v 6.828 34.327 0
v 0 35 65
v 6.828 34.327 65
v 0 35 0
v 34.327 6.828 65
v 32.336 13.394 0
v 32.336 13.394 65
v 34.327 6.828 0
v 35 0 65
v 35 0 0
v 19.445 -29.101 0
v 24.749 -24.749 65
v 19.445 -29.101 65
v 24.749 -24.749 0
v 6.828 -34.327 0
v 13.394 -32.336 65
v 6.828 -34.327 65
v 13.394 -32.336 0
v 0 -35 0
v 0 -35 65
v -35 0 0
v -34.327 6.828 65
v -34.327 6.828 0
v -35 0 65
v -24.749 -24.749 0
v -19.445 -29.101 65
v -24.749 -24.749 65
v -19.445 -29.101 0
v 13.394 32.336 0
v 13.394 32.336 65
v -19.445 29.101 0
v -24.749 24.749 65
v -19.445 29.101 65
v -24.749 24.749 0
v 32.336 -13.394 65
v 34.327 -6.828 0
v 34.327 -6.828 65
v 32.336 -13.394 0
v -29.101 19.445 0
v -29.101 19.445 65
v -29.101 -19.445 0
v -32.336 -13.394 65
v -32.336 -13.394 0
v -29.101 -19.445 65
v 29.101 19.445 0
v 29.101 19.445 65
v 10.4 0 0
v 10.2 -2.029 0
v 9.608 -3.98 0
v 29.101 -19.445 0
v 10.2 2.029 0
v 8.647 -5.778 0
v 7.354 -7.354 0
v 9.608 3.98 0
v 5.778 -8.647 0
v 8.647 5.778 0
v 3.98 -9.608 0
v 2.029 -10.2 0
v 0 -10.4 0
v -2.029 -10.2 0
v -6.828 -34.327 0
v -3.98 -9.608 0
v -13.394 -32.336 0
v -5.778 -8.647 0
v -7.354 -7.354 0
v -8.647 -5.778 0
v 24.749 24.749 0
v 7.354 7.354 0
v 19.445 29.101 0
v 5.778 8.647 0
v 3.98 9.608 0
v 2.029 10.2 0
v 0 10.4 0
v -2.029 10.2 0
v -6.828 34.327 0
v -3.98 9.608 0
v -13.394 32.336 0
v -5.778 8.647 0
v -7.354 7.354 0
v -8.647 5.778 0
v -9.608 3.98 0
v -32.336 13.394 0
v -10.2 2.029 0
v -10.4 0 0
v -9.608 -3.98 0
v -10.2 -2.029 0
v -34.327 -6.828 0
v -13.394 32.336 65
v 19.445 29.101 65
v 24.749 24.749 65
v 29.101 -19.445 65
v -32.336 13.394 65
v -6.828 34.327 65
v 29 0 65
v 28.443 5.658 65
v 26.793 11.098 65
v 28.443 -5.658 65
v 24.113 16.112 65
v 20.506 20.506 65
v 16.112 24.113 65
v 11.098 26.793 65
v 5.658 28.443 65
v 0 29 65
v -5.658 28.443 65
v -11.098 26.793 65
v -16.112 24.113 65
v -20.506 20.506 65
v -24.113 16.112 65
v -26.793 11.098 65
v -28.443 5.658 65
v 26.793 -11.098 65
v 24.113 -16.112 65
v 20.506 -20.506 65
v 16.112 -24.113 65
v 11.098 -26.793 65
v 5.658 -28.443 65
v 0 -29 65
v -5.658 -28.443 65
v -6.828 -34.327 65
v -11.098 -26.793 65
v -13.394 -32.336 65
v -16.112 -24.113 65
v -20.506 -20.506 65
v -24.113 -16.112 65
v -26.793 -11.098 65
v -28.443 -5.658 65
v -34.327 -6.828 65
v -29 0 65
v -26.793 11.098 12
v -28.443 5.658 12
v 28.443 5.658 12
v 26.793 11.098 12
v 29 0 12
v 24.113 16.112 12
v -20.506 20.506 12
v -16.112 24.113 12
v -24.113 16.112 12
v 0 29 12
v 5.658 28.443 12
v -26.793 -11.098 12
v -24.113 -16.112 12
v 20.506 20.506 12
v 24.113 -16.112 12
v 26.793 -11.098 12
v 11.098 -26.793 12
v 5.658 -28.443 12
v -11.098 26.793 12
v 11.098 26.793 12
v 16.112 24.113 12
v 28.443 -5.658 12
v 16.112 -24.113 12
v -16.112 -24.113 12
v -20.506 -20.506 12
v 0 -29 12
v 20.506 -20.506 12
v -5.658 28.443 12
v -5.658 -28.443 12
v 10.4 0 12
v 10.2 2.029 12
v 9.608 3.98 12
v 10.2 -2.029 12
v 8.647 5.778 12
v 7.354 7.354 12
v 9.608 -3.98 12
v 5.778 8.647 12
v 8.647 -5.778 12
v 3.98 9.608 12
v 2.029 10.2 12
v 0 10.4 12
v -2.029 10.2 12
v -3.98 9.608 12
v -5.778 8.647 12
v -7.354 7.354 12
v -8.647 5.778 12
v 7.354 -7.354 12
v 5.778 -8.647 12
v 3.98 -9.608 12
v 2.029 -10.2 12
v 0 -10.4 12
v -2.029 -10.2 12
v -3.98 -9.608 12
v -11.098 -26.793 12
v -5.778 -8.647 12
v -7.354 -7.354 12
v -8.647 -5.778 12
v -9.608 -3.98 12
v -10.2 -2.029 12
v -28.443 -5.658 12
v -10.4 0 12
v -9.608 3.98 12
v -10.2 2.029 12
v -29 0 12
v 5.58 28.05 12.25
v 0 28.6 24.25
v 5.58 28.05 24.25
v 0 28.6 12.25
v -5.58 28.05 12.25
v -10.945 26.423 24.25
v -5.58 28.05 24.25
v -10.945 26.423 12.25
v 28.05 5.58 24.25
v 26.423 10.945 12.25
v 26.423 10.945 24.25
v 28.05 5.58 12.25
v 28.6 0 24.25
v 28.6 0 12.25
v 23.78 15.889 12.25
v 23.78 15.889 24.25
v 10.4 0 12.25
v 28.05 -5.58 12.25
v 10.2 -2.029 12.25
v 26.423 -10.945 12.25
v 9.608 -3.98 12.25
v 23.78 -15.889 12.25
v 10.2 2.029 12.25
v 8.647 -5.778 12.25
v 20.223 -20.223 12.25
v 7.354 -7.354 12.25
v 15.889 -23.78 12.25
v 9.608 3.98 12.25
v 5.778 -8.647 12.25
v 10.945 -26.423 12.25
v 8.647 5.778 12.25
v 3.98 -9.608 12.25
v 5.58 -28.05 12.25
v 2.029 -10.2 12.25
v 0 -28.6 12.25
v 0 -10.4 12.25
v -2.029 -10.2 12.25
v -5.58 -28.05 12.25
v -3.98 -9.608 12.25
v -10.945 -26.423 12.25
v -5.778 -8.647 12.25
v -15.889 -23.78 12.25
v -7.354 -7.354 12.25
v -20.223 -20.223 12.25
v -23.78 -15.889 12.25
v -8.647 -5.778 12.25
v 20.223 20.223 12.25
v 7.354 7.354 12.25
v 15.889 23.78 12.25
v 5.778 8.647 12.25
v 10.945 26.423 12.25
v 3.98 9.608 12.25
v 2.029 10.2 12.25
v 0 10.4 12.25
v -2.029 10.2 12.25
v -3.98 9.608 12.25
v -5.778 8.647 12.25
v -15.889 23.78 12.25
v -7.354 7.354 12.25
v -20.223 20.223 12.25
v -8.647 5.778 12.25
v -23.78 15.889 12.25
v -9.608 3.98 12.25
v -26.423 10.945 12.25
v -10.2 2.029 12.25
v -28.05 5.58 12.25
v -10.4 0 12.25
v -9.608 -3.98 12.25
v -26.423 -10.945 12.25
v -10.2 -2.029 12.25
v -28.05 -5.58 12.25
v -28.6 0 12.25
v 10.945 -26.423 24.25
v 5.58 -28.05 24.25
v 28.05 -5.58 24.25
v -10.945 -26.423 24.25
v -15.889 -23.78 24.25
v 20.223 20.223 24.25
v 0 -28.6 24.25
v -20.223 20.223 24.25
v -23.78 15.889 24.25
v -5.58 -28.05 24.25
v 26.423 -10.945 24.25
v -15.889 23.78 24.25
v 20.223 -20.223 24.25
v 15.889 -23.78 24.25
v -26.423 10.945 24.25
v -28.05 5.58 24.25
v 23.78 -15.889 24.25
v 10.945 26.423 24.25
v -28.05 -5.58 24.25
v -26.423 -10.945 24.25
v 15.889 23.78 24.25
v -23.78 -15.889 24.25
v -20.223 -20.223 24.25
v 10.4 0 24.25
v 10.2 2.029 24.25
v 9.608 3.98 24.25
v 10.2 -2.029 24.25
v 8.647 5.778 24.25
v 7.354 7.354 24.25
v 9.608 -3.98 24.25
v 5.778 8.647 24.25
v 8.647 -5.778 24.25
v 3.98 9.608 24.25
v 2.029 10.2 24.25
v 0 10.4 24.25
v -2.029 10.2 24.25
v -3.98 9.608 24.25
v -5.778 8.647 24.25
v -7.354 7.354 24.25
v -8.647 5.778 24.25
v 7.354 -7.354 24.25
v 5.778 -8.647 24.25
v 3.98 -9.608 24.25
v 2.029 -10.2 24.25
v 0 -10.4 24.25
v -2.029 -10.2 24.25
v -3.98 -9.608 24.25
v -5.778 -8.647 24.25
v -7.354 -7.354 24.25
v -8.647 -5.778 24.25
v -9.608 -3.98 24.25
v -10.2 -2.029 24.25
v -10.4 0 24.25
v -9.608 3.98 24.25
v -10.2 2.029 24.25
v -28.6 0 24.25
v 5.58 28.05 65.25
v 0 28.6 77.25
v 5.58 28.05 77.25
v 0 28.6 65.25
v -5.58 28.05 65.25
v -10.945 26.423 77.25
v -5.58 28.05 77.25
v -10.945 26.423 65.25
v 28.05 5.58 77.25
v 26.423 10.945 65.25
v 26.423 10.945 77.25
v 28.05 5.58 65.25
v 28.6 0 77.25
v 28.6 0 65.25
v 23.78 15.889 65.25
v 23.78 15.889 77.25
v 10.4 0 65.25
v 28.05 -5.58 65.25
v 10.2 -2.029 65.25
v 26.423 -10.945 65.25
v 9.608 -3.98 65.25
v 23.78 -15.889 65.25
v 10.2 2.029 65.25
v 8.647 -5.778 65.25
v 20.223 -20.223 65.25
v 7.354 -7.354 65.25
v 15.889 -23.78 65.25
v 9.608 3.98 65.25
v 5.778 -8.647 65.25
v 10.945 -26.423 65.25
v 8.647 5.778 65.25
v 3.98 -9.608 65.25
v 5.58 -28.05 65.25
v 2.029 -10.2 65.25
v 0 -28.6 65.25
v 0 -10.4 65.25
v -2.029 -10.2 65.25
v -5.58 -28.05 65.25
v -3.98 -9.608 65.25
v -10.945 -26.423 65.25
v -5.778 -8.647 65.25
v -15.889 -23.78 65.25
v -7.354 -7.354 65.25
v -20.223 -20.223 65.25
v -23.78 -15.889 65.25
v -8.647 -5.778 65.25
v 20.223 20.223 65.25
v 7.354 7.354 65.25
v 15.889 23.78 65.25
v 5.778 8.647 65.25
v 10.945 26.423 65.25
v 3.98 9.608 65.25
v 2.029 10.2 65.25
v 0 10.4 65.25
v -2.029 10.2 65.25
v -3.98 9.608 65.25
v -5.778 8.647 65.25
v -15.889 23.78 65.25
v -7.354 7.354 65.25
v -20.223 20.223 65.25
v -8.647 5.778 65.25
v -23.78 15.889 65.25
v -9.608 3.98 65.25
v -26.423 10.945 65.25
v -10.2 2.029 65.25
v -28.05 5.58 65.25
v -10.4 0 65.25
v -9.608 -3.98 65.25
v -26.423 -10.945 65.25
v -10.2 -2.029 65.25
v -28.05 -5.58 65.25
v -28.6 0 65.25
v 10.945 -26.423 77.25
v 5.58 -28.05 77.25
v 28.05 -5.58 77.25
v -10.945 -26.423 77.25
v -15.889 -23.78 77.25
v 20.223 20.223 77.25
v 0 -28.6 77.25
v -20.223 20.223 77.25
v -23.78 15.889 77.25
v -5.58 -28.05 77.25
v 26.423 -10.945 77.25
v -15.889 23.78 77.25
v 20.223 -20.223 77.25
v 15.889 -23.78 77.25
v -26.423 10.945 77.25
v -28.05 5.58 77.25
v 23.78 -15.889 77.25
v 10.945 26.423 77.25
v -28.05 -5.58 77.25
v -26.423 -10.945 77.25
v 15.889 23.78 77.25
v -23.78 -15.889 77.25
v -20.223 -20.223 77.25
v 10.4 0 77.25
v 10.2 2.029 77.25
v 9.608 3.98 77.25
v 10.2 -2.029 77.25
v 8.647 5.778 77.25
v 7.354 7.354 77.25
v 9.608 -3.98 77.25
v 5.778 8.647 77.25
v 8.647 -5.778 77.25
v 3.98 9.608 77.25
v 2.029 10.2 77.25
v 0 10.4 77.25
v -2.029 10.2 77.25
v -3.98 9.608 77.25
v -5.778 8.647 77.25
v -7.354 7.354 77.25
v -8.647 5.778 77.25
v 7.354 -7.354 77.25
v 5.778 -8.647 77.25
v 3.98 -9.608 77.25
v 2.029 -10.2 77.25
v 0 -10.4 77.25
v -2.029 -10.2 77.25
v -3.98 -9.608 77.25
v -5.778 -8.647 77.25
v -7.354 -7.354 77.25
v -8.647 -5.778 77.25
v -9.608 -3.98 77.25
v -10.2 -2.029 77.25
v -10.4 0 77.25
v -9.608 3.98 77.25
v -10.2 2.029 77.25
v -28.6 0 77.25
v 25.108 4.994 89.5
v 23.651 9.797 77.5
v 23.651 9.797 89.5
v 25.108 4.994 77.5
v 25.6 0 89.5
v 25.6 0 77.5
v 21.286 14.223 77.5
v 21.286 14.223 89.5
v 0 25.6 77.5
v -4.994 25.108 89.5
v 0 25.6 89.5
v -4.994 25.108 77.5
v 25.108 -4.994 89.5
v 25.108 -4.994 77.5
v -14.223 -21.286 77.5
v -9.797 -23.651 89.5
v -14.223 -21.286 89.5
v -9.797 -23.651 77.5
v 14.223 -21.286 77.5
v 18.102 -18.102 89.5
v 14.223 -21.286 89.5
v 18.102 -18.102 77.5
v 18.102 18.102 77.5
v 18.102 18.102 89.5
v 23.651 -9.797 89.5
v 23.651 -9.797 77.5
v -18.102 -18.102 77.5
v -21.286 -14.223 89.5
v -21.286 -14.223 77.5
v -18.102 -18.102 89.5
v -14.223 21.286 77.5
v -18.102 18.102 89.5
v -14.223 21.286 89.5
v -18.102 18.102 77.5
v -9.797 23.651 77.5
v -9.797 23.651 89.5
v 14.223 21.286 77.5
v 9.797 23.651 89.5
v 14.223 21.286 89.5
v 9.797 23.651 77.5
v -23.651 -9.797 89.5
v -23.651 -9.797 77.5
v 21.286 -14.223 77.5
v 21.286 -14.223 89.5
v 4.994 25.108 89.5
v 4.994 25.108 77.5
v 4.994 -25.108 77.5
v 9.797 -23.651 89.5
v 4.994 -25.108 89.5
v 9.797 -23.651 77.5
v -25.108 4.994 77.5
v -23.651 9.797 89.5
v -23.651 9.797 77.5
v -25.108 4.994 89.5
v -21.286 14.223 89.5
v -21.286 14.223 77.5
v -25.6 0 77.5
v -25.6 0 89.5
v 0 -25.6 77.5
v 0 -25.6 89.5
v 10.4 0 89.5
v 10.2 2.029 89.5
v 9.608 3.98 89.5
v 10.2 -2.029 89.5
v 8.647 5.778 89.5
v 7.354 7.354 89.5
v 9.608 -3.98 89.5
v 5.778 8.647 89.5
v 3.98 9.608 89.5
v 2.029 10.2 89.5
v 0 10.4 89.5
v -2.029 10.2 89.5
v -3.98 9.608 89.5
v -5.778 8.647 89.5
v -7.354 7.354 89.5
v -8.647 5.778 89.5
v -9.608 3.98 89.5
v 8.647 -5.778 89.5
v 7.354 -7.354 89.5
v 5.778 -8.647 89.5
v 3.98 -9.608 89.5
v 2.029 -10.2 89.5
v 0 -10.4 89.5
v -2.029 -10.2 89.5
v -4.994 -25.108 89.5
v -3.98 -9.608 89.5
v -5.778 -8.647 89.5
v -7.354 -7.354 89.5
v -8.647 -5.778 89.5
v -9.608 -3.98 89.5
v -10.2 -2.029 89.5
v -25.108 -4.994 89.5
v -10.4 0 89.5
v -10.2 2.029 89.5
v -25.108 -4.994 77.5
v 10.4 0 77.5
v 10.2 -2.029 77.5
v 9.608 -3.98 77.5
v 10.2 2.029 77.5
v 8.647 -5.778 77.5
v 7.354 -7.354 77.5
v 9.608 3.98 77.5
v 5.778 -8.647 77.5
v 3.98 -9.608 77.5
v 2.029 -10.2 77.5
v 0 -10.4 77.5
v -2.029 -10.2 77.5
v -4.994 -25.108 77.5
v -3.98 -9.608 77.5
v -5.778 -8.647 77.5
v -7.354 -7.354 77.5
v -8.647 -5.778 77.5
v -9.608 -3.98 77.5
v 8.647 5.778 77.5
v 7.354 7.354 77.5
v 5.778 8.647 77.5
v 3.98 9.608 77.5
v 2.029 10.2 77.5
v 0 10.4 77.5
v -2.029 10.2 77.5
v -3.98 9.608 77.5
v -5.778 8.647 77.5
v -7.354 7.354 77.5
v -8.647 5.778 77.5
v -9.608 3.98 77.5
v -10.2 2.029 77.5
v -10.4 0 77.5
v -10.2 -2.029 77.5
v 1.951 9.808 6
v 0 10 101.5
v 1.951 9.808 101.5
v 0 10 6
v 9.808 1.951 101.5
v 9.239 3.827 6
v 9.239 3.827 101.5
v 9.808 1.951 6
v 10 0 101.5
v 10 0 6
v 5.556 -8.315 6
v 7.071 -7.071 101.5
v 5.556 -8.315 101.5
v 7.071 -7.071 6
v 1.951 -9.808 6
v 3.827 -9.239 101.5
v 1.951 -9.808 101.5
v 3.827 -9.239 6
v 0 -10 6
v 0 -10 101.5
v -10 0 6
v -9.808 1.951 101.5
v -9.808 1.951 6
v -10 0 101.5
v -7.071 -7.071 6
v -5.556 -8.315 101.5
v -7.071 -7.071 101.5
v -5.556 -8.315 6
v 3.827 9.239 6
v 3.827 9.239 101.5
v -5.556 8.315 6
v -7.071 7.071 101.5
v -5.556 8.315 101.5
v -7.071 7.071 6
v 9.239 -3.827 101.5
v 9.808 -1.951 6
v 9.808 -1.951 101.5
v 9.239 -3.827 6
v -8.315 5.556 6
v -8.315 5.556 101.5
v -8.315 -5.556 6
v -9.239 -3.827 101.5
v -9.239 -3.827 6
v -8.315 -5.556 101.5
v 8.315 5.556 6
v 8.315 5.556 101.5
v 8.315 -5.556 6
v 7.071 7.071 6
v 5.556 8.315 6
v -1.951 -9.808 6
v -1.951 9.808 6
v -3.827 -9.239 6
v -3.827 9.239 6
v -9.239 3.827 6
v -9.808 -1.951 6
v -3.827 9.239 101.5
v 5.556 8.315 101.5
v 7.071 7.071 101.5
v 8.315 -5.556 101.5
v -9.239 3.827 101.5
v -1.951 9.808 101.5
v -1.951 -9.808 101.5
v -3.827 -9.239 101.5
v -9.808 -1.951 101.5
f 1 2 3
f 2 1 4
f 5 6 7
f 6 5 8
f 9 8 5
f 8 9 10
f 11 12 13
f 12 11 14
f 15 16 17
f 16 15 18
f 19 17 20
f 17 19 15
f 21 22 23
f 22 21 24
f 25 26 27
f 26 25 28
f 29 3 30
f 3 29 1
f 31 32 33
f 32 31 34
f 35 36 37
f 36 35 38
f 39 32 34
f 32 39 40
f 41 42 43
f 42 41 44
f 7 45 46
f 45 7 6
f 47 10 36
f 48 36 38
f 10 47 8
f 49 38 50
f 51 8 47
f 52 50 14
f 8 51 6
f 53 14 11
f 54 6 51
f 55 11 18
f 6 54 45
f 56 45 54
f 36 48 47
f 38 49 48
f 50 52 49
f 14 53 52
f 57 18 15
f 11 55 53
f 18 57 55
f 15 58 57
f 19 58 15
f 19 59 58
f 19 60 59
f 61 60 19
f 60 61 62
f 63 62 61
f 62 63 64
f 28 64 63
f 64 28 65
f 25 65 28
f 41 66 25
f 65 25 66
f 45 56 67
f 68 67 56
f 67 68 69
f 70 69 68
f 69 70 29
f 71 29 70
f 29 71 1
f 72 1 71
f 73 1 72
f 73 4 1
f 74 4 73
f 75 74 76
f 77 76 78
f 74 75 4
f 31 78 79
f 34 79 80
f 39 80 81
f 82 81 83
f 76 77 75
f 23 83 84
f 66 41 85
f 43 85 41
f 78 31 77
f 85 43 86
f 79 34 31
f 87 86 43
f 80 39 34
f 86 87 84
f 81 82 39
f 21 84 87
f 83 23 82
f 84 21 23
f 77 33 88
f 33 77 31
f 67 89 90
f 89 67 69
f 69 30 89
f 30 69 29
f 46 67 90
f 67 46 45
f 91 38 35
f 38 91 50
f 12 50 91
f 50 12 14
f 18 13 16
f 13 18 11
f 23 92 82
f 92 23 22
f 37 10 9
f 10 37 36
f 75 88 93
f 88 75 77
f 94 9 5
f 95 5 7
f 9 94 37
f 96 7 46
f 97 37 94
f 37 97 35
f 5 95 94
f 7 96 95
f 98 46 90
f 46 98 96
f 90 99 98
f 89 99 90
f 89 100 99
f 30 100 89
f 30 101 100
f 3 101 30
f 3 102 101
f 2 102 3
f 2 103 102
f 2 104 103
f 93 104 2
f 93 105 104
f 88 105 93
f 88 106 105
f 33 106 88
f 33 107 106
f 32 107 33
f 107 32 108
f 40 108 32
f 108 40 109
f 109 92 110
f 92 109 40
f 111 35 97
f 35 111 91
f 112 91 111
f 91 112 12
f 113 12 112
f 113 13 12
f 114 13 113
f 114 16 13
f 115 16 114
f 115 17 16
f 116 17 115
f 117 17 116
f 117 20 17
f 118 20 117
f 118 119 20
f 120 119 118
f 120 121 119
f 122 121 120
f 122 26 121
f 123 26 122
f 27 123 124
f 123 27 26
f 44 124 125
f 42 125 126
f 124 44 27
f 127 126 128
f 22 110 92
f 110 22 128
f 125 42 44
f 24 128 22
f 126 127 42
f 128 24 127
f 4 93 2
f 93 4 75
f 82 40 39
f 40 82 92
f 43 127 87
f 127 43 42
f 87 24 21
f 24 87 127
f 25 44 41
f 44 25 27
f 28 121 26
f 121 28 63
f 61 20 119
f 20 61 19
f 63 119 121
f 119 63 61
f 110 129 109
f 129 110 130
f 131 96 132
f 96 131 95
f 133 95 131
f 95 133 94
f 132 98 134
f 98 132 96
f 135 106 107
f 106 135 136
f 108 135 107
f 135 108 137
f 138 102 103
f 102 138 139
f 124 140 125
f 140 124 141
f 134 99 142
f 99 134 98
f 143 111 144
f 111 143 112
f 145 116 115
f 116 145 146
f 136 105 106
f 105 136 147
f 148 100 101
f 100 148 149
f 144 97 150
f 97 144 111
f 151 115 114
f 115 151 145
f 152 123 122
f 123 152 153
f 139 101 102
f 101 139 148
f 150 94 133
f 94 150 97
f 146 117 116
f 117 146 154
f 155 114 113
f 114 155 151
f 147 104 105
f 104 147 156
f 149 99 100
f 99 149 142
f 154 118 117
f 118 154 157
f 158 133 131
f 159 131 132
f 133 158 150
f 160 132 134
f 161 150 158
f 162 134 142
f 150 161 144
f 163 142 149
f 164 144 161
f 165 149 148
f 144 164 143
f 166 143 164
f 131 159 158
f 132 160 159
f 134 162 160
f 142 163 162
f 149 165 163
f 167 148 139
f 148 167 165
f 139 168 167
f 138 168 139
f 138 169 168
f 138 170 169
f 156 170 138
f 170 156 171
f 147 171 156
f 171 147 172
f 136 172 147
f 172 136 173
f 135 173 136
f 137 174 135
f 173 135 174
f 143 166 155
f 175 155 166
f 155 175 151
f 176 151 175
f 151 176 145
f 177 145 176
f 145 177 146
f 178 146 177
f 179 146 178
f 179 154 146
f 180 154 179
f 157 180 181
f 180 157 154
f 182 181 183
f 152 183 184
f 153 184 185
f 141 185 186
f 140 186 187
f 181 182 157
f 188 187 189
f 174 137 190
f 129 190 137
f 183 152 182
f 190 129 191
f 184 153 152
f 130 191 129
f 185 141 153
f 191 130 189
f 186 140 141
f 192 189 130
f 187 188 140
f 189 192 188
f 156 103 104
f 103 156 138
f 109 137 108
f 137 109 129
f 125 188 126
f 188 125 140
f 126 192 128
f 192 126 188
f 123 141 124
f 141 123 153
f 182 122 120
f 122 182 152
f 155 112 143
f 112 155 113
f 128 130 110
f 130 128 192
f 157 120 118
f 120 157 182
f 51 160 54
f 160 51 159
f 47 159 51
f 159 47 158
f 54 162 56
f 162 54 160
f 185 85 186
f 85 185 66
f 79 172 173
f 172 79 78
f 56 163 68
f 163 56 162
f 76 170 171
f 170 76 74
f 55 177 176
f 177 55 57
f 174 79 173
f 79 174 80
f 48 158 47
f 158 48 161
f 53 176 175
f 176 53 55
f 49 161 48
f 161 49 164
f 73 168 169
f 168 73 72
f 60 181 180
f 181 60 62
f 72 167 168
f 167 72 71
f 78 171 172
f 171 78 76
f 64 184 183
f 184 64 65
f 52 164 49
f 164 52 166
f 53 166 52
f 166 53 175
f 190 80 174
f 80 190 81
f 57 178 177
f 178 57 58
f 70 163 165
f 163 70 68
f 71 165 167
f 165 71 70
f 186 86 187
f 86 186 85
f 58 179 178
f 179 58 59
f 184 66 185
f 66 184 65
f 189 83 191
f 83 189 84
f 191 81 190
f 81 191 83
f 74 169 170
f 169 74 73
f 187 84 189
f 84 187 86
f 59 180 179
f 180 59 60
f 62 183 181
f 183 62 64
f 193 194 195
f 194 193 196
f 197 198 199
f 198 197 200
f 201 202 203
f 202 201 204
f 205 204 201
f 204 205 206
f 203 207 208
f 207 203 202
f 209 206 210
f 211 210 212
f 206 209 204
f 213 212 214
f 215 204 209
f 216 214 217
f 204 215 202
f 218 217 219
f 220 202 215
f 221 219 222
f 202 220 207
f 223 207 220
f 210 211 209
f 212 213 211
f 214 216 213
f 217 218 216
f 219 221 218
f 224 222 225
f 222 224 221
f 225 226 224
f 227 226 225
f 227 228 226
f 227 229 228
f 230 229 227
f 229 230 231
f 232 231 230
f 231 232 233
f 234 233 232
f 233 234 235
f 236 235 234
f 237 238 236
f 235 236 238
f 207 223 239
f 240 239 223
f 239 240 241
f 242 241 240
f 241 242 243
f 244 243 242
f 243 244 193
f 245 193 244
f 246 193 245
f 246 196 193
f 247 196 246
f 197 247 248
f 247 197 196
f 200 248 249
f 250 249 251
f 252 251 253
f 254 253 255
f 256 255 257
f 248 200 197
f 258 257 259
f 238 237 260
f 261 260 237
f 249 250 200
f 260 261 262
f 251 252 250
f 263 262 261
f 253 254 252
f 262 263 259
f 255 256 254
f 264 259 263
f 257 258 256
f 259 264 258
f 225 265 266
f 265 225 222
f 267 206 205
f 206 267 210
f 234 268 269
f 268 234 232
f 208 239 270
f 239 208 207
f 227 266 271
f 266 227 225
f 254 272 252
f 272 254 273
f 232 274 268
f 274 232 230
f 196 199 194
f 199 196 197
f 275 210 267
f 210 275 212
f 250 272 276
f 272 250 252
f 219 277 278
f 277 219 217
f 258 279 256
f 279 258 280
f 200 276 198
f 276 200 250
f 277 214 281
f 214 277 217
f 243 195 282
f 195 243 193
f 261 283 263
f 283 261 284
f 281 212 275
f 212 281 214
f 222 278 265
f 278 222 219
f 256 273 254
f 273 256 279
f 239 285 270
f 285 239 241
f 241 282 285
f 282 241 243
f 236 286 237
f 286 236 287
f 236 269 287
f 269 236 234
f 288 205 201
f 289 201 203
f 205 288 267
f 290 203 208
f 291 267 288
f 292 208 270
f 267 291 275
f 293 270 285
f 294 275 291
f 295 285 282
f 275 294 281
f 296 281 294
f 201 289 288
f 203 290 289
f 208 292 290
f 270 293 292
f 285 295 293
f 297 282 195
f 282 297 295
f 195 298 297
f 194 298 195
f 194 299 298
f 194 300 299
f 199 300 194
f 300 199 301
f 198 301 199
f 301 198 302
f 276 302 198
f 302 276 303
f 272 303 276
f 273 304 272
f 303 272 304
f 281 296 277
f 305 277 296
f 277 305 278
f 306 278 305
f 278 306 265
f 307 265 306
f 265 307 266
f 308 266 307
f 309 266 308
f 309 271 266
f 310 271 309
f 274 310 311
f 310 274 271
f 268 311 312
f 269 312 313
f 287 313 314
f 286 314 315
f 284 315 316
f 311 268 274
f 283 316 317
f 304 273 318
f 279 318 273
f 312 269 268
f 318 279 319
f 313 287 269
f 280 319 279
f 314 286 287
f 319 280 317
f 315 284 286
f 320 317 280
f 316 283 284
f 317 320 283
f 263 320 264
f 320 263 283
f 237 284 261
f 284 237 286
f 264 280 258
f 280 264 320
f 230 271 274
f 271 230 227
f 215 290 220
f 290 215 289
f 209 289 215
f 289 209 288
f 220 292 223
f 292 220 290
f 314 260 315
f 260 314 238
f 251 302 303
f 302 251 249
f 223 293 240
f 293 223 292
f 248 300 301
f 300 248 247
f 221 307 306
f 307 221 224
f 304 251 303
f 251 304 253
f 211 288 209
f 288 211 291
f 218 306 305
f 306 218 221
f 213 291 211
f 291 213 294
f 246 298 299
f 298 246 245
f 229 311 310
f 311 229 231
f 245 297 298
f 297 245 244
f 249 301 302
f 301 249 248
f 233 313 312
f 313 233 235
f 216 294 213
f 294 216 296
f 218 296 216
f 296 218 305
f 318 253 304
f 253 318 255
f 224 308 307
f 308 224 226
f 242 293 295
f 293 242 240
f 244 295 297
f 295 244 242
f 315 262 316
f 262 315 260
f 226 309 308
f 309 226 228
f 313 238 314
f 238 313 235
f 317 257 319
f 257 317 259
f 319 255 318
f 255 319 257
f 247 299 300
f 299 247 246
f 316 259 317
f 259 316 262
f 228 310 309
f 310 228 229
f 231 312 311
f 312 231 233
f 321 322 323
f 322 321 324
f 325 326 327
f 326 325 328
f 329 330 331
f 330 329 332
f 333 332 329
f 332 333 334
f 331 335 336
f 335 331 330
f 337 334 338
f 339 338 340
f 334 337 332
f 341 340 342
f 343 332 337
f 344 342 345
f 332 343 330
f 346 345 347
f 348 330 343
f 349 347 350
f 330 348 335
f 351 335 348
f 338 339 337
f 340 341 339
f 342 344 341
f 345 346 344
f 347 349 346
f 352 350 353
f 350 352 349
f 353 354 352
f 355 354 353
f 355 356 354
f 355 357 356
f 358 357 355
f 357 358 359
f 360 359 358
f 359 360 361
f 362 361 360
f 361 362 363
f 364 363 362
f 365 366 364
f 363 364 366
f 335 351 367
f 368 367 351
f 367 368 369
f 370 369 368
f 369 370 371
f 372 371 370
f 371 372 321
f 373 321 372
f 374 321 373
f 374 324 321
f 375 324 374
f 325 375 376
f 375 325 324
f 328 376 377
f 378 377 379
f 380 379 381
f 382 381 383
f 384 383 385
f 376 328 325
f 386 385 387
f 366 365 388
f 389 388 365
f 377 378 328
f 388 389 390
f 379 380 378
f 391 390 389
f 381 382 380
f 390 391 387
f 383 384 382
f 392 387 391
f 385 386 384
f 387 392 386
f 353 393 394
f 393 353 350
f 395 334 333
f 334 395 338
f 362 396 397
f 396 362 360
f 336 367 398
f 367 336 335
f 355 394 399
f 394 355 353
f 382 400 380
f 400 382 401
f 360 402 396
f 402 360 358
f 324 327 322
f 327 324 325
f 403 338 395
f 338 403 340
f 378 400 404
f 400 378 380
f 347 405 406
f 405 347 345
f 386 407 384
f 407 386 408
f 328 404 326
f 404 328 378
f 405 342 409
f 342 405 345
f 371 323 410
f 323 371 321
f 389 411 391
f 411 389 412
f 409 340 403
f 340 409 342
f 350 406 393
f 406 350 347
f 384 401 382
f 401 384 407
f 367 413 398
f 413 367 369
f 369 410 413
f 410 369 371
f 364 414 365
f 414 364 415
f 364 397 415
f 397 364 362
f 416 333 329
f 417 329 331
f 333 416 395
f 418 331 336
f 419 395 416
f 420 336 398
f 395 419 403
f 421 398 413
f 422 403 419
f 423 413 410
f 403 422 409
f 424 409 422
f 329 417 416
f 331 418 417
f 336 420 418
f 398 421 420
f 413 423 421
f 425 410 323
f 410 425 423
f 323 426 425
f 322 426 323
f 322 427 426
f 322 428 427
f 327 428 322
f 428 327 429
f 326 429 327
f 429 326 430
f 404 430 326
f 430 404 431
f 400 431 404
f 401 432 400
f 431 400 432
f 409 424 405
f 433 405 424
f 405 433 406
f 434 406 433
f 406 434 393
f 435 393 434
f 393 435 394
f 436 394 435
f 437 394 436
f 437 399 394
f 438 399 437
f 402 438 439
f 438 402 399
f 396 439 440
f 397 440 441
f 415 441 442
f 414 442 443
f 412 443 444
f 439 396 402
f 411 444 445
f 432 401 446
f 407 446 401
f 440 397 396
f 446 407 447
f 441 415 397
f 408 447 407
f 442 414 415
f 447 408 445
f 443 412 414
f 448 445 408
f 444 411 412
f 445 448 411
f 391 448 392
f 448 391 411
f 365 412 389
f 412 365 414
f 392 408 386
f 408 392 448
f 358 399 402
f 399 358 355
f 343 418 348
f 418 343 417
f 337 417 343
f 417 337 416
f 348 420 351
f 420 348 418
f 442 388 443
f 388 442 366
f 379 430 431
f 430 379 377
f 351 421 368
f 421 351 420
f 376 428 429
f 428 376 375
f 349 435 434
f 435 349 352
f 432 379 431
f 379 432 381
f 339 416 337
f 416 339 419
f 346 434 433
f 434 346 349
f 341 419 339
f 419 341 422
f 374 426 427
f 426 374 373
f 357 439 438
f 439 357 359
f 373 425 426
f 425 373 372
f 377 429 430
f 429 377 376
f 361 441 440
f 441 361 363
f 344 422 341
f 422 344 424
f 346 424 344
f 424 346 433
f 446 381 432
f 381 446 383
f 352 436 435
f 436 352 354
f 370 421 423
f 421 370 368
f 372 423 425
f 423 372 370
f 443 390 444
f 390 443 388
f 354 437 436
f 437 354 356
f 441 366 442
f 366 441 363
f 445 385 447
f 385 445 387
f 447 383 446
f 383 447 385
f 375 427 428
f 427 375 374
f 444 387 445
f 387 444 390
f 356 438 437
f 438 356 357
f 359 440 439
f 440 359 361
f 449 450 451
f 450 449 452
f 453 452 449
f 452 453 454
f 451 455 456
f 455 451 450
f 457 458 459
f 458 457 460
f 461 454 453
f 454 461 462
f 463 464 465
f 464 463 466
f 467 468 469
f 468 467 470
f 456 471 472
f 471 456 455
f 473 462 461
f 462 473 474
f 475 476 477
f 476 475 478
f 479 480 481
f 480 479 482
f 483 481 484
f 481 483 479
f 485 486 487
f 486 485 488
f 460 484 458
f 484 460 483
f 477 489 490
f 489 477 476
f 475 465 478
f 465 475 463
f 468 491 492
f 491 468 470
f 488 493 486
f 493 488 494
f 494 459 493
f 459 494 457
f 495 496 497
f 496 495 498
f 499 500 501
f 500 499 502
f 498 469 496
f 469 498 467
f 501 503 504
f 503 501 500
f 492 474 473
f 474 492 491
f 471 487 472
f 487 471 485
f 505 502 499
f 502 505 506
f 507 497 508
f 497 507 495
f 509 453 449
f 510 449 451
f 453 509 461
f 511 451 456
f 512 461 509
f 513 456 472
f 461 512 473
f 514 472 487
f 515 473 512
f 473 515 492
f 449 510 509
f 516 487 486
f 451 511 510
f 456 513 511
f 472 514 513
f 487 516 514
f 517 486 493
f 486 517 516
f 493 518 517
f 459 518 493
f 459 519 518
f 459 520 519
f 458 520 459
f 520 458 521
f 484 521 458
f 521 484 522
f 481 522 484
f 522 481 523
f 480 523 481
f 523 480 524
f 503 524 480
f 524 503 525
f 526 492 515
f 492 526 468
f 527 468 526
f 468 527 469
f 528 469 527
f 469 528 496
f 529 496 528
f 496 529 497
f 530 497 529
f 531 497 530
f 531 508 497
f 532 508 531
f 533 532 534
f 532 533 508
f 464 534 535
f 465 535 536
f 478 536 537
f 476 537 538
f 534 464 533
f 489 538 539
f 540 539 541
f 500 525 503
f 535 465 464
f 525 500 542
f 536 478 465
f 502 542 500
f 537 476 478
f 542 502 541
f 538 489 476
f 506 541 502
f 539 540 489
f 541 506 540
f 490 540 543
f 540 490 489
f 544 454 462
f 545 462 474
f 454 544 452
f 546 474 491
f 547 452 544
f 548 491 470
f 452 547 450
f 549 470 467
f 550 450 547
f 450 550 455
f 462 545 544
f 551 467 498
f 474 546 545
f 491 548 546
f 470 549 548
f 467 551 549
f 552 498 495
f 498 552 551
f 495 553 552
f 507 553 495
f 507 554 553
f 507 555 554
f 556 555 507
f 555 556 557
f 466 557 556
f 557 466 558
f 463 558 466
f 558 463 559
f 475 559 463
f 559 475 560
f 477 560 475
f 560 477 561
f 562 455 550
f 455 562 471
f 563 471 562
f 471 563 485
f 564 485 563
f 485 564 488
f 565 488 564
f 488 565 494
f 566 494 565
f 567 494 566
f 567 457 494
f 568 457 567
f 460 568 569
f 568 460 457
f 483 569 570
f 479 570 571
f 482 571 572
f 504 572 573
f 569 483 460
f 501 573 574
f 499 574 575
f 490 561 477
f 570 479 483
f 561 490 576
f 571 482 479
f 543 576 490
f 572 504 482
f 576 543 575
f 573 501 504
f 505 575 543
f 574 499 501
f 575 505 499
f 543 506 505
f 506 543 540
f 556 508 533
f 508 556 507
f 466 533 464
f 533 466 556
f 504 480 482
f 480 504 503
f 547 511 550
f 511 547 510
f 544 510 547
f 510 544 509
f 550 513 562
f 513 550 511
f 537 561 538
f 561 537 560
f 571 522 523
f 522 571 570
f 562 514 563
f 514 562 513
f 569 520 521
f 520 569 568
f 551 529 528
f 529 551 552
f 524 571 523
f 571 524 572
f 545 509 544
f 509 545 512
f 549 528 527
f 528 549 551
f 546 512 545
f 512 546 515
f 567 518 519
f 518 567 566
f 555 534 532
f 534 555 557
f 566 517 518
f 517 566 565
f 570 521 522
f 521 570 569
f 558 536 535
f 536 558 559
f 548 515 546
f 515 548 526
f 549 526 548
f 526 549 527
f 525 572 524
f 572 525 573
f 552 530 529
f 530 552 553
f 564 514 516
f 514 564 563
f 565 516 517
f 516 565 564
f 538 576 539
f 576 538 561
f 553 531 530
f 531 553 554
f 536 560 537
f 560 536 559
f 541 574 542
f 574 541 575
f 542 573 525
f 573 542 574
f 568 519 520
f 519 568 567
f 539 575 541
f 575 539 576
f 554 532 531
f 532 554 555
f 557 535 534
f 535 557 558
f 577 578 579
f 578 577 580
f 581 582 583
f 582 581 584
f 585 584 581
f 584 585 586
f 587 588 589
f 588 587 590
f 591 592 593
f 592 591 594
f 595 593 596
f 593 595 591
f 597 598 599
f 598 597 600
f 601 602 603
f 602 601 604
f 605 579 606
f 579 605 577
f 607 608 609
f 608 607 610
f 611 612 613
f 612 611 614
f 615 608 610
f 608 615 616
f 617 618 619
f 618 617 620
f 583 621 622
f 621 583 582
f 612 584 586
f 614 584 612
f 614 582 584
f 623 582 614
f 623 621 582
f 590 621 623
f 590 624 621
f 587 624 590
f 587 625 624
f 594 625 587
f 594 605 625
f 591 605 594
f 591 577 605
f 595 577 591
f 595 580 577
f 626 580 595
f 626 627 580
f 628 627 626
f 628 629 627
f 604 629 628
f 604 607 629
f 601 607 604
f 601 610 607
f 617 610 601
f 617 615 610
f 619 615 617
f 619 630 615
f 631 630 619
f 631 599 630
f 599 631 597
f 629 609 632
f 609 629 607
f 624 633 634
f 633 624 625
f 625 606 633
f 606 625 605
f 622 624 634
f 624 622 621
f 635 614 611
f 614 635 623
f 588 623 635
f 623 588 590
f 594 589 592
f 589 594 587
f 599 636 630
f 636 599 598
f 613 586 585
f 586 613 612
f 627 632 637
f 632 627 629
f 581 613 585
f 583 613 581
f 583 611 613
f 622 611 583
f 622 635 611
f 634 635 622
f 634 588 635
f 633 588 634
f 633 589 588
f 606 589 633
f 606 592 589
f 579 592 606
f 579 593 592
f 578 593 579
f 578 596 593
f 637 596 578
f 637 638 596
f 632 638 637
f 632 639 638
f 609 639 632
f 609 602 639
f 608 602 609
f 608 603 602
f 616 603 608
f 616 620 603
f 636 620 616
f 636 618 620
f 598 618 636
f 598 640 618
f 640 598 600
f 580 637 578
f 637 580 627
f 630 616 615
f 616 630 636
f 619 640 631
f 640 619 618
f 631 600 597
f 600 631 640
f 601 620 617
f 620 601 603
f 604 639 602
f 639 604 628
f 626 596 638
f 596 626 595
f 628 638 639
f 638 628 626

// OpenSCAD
$fn = 32;

// ------------------------------------------------------------------------
// Bearing housing: housing d70, two bearings and a shaft
// Every part is its own module, assembly() places them once.
// ------------------------------------------------------------------------

// --- part 1 ---
module housing() {
  difference() {
    cylinder(h = 65, d = 70);
    translate([0, 0, 12]) cylinder(h = 54, d = 58);
    translate([0, 0, -1]) cylinder(h = 14, d = 20.8);
  }
}

// --- part 2 ---
module bearing_lower() {
  difference() {
      translate([0, 0, 0]) cylinder(h = 12, d = 57.2);
      translate([0, 0, -1]) cylinder(h = 14, d = 20.8);
    }
}

// --- part 3 ---
module bearing_upper() {
  difference() {
      translate([0, 0, 0]) cylinder(h = 12, d = 57.2);
      translate([0, 0, -1]) cylinder(h = 14, d = 20.8);
    }
}

// --- part 4 ---
module spacer() {
  difference() {
      translate([0, 0, 0]) cylinder(h = 12, d = 51.2);
      translate([0, 0, -1]) cylinder(h = 14, d = 20.8);
    }
}

// --- part 5 ---
module shaft() {
  translate([0, 0, -47.75]) cylinder(h = 95.5, d = 20);
}

// --- assembly ---
module assembly() {
  translate([0, 0, 0]) rotate([0, 0, 0]) housing();
  translate([0, 0, 12.25]) rotate([0, 0, 0]) bearing_lower();
  translate([0, 0, 65.25]) rotate([0, 0, 0]) bearing_upper();
  translate([0, 0, 77.5]) rotate([0, 0, 0]) spacer();
  translate([0, 0, 53.75]) rotate([0, 0, 0]) shaft();
}

assembly();
